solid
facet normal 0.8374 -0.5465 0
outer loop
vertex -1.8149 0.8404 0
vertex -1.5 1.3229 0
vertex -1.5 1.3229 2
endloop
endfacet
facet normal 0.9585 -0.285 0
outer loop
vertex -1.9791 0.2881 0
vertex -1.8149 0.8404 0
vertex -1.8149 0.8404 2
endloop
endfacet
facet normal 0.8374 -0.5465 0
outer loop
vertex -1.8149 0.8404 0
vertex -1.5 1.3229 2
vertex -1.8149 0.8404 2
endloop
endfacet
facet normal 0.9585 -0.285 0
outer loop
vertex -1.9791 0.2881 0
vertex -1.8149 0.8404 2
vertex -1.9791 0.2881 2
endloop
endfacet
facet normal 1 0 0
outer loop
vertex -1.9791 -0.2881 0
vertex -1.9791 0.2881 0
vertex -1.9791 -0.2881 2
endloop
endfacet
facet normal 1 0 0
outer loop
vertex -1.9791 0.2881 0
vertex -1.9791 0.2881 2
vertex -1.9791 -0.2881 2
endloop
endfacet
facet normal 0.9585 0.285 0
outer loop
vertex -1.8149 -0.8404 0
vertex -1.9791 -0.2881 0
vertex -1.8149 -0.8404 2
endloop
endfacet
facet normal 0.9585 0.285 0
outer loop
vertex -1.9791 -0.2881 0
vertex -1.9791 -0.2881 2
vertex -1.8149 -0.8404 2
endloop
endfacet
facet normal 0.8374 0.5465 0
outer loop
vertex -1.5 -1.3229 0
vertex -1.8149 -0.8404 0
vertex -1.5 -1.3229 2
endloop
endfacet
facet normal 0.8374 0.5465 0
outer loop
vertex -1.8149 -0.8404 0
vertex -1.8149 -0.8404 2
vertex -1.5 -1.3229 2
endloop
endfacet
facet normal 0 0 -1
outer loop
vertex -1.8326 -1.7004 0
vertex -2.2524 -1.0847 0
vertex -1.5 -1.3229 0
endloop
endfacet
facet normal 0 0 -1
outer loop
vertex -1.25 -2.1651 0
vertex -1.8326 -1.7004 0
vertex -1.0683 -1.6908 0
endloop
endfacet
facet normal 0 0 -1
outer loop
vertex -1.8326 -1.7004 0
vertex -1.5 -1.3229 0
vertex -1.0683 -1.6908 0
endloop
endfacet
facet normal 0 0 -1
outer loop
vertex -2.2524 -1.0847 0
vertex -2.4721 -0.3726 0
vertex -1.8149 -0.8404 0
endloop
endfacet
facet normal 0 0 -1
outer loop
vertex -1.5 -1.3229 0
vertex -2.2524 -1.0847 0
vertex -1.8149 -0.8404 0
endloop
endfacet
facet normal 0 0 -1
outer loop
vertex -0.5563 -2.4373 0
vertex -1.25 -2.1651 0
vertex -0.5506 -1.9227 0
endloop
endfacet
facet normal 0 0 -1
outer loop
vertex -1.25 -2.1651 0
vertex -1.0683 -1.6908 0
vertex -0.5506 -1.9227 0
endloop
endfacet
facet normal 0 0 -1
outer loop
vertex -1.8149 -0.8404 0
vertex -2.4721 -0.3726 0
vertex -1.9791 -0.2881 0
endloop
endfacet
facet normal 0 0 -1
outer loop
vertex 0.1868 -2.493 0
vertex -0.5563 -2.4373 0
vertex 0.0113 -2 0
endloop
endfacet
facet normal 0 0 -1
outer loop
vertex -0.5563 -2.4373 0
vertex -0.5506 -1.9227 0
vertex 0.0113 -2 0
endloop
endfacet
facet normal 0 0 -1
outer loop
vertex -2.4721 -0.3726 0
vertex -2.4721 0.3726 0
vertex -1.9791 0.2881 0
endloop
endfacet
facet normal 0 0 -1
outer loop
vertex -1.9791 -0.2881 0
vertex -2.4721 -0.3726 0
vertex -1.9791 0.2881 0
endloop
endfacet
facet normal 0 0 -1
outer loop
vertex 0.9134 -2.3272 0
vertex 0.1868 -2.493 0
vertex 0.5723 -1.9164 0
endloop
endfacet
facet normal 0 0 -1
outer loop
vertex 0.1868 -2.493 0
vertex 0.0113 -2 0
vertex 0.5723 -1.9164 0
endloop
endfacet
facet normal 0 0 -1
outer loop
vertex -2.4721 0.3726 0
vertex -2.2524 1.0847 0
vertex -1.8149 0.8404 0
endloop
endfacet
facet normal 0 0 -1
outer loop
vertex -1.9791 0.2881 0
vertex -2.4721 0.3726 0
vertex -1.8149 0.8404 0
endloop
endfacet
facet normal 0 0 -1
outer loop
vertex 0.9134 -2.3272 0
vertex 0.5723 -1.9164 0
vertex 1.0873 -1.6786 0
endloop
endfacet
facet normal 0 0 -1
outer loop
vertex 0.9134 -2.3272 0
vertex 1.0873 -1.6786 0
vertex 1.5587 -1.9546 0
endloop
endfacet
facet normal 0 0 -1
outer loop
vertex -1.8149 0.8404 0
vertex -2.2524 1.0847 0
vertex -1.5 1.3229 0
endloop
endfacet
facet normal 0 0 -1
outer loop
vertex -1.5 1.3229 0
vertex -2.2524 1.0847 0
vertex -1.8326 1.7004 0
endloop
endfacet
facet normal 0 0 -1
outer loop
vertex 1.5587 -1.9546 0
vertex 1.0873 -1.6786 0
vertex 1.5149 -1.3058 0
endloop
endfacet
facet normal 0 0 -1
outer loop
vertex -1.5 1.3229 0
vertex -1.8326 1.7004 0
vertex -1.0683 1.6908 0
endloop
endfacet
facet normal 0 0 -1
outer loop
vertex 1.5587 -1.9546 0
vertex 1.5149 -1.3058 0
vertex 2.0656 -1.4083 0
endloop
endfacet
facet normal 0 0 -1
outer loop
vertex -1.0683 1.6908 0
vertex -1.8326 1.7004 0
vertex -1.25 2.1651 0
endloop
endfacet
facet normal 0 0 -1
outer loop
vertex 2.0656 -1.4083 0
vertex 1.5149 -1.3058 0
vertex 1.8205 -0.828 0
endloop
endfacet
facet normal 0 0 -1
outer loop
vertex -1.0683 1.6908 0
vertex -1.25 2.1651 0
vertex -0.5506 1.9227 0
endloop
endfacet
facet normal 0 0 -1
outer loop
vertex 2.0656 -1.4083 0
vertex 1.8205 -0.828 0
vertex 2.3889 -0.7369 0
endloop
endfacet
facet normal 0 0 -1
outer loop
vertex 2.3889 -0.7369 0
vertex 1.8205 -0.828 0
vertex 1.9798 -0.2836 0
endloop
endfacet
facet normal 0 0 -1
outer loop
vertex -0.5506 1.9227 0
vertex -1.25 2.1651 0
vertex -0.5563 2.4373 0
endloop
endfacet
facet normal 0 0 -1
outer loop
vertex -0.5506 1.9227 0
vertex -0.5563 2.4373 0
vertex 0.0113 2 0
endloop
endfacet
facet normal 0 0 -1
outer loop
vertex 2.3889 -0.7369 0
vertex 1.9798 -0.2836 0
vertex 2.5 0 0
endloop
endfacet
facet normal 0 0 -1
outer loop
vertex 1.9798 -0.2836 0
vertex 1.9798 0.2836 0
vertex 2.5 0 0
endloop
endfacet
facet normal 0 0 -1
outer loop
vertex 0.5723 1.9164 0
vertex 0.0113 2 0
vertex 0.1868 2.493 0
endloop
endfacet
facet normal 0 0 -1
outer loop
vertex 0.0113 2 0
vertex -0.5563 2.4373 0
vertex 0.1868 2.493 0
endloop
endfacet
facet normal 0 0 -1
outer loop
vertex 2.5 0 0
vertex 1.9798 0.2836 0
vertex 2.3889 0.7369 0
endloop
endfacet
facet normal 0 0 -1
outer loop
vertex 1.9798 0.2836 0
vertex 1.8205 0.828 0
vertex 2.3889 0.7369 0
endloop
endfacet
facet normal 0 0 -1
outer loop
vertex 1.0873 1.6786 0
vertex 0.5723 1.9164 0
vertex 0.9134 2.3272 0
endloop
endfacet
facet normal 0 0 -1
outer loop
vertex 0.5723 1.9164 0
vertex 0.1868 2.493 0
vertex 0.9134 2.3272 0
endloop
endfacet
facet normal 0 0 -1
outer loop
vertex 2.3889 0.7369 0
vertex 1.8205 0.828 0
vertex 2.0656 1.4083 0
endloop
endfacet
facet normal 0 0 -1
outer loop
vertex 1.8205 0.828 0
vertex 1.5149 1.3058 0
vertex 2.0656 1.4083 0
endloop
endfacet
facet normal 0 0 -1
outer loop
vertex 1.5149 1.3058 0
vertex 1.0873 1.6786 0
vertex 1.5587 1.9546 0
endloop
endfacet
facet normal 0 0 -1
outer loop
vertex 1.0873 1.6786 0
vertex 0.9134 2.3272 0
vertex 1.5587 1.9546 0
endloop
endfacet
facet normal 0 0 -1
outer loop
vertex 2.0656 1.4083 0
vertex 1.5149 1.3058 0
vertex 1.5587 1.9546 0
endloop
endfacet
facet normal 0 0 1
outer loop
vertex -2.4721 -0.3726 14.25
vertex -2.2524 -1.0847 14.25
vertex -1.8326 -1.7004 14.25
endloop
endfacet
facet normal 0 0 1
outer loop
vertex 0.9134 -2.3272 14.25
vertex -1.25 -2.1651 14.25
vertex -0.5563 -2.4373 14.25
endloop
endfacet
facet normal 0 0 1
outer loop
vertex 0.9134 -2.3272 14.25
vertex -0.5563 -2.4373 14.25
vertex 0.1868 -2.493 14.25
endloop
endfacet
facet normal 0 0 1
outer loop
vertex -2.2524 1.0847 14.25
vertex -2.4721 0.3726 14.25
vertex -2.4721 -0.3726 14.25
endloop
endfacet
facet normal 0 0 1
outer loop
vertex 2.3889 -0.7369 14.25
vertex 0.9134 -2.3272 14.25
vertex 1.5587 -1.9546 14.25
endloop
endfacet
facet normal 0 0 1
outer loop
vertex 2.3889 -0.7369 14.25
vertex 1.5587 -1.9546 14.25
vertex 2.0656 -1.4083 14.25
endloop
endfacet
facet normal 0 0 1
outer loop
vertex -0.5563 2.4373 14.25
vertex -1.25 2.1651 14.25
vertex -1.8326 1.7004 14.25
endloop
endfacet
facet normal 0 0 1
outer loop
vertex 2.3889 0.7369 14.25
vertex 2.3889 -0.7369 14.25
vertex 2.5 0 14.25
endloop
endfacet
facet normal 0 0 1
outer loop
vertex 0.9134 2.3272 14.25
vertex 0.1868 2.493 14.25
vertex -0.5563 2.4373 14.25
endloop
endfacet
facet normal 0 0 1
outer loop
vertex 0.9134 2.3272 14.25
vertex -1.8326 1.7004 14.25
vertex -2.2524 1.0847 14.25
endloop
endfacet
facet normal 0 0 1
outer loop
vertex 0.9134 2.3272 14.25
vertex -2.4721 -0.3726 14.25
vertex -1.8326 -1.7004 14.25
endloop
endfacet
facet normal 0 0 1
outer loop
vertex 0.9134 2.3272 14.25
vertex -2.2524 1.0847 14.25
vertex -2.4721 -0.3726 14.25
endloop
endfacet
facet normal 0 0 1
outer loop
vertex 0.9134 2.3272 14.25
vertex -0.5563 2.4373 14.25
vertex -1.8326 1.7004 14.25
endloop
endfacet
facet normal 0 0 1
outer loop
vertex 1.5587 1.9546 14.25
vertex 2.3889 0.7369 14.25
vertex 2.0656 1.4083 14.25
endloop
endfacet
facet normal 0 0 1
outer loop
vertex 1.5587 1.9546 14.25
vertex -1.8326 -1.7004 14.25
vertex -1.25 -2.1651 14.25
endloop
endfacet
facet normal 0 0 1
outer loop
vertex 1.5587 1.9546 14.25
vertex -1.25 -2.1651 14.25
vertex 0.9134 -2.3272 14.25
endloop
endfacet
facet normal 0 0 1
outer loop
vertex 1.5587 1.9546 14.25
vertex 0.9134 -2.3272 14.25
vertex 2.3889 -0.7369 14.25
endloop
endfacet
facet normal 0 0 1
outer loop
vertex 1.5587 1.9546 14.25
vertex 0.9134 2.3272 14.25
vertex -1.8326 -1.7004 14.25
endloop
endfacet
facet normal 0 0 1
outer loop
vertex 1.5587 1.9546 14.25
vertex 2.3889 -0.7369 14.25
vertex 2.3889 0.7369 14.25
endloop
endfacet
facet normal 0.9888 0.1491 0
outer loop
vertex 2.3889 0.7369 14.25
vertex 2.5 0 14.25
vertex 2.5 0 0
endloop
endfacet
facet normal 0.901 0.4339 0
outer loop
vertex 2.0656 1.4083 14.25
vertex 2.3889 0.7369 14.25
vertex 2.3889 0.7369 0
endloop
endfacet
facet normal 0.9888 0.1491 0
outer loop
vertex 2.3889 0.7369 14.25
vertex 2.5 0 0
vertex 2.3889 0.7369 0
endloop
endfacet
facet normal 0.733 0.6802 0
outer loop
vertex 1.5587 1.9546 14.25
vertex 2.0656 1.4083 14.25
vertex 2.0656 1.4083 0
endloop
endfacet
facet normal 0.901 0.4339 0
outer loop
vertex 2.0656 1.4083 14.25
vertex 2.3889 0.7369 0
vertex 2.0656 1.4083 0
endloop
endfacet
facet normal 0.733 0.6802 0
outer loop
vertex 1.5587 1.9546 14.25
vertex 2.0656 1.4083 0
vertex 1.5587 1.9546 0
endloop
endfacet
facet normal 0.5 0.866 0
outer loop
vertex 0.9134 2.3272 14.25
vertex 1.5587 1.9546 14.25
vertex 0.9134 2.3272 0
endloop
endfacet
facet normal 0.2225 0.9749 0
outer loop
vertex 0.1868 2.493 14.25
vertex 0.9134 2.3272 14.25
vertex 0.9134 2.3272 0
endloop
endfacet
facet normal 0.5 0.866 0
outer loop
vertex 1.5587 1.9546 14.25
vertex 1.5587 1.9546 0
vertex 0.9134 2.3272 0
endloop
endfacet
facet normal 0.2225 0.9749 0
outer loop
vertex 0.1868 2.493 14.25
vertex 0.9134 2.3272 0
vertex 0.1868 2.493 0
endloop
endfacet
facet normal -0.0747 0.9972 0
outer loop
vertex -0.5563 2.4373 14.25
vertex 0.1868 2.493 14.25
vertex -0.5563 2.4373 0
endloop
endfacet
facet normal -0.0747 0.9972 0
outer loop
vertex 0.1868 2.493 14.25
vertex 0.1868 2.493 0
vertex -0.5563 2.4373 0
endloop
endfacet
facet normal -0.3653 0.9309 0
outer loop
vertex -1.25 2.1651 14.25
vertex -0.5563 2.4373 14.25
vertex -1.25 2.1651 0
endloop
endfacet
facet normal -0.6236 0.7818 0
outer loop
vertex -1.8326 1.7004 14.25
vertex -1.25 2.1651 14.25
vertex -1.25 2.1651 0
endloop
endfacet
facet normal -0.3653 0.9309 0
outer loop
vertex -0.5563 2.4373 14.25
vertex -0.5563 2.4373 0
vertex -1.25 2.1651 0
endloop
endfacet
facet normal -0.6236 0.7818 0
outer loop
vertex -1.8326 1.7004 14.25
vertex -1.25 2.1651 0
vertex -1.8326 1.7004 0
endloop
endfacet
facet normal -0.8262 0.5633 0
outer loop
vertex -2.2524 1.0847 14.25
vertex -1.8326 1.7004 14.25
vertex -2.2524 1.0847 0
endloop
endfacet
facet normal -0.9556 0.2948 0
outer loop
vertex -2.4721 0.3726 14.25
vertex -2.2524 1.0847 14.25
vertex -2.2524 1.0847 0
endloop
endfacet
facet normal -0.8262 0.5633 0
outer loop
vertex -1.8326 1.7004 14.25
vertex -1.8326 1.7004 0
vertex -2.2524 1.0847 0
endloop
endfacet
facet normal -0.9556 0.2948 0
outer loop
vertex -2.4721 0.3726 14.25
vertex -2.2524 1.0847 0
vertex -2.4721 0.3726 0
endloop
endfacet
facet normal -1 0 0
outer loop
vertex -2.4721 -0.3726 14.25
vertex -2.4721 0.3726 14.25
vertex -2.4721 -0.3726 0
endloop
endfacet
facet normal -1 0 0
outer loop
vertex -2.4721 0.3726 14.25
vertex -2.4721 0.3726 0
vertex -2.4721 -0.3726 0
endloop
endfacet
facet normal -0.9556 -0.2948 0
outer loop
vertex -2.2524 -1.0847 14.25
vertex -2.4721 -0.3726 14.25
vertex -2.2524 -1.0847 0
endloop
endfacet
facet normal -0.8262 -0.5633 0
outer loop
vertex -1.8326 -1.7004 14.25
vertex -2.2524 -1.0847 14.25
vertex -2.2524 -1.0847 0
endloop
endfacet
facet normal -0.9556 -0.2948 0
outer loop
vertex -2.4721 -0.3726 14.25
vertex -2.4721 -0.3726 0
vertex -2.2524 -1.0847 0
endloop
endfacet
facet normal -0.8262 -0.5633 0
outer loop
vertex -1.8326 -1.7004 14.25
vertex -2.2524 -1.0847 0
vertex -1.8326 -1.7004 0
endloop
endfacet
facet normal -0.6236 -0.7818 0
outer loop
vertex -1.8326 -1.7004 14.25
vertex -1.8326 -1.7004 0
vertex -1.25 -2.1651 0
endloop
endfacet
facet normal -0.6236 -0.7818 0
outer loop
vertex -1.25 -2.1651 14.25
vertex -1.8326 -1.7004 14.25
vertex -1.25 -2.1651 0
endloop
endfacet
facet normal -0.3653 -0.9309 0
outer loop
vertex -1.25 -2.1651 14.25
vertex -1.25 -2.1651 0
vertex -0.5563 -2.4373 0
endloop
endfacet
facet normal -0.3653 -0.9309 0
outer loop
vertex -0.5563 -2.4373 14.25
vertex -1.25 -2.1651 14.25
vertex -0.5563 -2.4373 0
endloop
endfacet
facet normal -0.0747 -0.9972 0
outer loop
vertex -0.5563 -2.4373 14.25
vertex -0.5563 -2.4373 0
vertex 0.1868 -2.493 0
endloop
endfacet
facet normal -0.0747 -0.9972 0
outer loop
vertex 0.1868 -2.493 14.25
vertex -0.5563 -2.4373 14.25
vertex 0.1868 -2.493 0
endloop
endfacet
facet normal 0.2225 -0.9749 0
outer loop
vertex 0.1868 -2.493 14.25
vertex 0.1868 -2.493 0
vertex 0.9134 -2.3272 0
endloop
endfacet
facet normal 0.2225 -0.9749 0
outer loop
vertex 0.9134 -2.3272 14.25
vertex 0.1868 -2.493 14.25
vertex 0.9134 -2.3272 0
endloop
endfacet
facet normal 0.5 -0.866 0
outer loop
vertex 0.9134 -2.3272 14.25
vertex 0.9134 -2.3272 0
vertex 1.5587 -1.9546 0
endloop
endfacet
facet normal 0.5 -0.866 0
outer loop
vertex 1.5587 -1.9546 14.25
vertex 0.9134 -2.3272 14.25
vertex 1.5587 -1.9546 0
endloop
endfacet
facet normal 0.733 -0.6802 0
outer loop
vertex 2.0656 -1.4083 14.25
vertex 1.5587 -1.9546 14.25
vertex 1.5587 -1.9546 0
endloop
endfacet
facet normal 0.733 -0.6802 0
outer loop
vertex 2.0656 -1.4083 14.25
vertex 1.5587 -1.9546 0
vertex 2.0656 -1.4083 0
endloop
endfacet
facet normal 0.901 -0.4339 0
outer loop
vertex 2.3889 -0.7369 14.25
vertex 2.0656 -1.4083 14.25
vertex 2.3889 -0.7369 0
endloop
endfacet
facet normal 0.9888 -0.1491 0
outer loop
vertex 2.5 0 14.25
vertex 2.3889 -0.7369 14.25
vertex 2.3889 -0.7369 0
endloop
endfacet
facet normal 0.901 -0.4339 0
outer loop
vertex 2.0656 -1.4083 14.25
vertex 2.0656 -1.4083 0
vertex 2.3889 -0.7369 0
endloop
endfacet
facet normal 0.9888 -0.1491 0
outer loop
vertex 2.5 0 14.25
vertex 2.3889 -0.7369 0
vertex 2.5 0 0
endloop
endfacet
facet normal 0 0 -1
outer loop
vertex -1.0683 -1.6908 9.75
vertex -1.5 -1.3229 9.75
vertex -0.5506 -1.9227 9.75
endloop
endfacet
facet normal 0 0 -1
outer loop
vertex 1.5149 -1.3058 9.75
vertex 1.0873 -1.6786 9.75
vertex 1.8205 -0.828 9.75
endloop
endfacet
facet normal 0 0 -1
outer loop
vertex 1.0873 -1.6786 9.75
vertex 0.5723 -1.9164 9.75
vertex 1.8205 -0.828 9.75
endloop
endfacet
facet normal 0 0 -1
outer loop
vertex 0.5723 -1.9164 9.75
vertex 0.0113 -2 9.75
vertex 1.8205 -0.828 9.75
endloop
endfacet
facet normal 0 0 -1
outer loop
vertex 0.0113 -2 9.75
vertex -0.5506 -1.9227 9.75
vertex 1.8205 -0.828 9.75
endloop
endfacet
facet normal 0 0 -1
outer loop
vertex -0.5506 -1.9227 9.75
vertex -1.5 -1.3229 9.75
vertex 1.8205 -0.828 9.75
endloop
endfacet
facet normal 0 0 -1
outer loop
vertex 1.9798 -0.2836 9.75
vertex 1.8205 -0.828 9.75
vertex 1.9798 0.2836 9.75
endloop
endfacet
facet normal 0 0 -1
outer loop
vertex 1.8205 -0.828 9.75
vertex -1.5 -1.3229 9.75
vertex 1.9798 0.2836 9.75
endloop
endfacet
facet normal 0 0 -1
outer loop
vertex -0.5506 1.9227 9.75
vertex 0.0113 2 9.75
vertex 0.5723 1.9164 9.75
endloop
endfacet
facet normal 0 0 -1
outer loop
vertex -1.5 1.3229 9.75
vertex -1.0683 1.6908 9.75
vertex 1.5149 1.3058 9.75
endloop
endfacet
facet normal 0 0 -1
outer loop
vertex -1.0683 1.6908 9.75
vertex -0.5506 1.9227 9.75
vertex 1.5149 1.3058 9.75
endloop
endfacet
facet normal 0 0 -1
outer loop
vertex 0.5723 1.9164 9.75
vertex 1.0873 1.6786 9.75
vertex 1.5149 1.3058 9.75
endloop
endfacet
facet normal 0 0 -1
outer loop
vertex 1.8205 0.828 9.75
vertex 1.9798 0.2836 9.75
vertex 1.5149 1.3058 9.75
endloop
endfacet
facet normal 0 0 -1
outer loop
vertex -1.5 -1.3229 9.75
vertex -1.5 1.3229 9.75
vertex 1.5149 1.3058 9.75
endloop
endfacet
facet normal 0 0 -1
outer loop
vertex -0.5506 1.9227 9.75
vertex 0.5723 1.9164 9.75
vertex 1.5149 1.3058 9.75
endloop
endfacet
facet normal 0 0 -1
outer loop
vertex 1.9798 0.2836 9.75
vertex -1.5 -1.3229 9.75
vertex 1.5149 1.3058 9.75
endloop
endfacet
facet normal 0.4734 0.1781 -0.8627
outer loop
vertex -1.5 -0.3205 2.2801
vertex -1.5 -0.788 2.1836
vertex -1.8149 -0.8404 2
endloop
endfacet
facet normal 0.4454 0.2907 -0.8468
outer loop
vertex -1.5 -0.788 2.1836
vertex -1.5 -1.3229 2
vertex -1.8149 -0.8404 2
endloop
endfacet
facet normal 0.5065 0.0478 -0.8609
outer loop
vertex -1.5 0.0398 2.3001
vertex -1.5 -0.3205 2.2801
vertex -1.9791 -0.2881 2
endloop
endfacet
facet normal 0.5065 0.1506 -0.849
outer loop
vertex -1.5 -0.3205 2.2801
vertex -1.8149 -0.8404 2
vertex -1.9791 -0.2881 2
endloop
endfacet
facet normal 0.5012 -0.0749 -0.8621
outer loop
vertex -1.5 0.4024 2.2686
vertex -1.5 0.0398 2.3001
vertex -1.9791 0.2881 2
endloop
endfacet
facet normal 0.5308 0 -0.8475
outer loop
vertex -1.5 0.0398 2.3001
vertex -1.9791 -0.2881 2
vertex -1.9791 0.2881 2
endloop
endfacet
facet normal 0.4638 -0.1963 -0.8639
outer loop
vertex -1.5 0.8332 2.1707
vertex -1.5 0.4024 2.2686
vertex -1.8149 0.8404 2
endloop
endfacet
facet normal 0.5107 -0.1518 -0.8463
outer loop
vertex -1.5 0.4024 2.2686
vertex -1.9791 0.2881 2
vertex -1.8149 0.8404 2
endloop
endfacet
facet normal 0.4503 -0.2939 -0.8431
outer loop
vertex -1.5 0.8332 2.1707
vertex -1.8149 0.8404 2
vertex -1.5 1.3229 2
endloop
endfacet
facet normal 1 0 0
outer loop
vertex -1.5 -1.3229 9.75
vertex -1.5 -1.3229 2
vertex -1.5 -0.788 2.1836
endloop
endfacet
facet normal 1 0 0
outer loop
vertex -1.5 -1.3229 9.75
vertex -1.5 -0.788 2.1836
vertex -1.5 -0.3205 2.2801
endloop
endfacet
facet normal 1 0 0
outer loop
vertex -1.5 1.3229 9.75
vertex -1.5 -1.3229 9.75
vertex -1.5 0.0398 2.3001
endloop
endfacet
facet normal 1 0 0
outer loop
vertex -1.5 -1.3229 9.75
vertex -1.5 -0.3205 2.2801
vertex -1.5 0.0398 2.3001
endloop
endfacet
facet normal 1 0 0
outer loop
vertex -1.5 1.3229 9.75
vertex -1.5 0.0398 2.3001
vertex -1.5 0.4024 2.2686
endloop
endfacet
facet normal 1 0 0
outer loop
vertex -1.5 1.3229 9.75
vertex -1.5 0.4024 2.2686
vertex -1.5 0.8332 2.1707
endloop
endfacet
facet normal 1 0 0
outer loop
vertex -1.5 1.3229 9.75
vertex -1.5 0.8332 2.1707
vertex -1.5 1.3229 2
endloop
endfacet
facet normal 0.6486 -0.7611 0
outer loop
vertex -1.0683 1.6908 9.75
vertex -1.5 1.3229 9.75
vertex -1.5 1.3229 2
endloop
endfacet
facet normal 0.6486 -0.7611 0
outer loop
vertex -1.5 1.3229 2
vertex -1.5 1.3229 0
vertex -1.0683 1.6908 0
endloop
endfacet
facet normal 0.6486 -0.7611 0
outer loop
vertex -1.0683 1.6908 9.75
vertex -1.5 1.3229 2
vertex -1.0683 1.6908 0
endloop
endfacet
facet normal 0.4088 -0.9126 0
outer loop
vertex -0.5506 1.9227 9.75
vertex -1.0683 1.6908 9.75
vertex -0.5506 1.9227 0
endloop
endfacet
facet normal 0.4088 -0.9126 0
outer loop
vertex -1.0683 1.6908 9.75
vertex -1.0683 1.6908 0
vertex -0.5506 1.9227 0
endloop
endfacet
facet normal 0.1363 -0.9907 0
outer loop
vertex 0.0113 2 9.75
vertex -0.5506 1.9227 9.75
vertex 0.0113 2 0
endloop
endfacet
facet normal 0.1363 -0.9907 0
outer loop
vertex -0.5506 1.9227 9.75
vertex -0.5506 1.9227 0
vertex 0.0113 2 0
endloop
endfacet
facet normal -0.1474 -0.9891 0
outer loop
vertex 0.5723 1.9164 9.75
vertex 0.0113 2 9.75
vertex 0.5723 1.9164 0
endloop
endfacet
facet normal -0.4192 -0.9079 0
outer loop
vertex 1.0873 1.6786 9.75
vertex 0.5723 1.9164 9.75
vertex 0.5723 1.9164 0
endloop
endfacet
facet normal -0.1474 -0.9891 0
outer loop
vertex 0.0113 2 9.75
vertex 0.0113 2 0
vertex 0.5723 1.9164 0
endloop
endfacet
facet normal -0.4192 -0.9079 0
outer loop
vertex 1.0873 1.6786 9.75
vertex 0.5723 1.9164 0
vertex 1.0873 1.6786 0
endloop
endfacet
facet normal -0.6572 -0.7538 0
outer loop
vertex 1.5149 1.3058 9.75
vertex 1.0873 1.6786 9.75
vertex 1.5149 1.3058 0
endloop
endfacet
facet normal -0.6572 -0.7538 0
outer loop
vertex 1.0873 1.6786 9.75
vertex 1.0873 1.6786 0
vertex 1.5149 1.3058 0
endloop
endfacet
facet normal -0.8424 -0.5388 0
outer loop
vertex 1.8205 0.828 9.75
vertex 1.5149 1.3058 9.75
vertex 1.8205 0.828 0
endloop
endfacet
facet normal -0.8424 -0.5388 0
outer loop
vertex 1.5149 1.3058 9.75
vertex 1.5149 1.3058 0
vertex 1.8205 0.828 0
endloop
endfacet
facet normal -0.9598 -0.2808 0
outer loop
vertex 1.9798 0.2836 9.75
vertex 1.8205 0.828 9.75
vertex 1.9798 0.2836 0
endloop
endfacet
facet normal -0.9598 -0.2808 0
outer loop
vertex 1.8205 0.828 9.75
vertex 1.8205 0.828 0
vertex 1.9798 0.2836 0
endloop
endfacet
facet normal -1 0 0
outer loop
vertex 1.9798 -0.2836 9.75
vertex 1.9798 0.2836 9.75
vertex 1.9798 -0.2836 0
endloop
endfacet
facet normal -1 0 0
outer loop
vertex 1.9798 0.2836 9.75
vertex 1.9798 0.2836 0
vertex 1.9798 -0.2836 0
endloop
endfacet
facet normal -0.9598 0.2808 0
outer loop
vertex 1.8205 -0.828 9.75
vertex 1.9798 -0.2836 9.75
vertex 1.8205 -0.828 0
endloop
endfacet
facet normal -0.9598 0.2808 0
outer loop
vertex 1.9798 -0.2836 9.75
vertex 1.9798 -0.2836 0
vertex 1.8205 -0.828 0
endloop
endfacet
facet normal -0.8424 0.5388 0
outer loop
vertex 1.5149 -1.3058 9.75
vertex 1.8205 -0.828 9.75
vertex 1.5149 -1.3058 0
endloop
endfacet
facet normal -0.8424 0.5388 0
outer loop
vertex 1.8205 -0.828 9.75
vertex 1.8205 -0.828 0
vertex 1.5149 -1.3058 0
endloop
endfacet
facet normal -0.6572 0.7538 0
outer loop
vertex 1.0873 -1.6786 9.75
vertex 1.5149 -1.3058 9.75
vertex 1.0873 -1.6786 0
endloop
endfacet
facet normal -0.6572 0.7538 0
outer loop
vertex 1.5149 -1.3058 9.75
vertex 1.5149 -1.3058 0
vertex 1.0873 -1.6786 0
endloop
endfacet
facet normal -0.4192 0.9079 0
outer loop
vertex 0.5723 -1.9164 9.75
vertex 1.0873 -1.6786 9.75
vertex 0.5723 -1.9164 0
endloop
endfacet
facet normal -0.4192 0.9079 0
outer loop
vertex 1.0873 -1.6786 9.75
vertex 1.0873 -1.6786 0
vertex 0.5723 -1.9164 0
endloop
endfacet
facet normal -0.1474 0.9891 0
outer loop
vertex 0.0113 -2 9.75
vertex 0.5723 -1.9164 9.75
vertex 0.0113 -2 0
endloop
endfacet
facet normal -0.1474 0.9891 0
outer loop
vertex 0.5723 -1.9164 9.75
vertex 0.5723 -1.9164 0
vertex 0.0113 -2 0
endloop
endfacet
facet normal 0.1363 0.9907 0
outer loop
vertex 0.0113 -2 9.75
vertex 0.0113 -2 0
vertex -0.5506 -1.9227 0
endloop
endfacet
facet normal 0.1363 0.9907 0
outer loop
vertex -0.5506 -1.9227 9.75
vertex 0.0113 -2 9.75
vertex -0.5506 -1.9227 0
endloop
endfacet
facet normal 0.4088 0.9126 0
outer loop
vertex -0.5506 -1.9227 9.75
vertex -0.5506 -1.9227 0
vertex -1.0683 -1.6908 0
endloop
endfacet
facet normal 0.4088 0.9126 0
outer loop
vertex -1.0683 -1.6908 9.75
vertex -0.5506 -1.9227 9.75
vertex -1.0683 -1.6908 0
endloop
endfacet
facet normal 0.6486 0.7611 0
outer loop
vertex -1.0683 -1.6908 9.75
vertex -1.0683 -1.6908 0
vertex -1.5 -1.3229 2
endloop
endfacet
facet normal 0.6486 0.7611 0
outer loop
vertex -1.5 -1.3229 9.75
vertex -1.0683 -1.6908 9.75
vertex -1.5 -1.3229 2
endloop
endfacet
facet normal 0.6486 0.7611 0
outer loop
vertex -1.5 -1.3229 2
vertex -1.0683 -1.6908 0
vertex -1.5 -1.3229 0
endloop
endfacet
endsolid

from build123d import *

# Parameters (mm, degrees)
F0_R     = 2.5
F1_DEPTH = 14.25
F3_D     = 4
F3_DEPTH = 2
F3_TIP   = 1.2017212381
F4_R     = 2.1505871319
F5_DEPTH = 4.5


with BuildPart() as f1:
    # F0 (on Top) → F1 (new body)
    with BuildSketch(Plane.XY):
        Circle(F0_R)
        with BuildLine():
            ThreePointArc((-1.5, 1.3228756555), (2, 0), (-1.5, -1.3228756555))
            Line((-1.5, -1.3228756555), (-1.5, 1.3228756555))
        make_face(mode=Mode.SUBTRACT)
    extrude(amount=F1_DEPTH)

    # F3
    with Locations(Plane(origin=(0, 0, 0), x_dir=(1, 0, 0), z_dir=(0, 0, -1))):
        with Locations((0, 0)):
            Hole(F3_D / 2, depth=F3_DEPTH)
            with Locations((0, 0, -(F3_DEPTH + F3_TIP / 2))):  # 118° drill point
                Cone(0, F3_D / 2, F3_TIP, mode=Mode.SUBTRACT)

    # F4 (on face) → F5 (join)
    with BuildSketch(Plane.XY.offset(14.25)):
        Circle(F4_R)
        with BuildLine():
            Line((-1.5, -1.3228756555), (-1.5, 1.3228756555))
            ThreePointArc((-1.5, 1.3228756555), (2, 0), (-1.5, -1.3228756555))
        make_face(mode=Mode.SUBTRACT)
        with BuildLine():
            ThreePointArc((-1.5, -1.3228756555), (2, 0), (-1.5, 1.3228756555))
            Line((-1.5, 1.3228756555), (-1.5, -1.3228756555))
        make_face()
    extrude(amount=-F5_DEPTH)


solid = f1.part
